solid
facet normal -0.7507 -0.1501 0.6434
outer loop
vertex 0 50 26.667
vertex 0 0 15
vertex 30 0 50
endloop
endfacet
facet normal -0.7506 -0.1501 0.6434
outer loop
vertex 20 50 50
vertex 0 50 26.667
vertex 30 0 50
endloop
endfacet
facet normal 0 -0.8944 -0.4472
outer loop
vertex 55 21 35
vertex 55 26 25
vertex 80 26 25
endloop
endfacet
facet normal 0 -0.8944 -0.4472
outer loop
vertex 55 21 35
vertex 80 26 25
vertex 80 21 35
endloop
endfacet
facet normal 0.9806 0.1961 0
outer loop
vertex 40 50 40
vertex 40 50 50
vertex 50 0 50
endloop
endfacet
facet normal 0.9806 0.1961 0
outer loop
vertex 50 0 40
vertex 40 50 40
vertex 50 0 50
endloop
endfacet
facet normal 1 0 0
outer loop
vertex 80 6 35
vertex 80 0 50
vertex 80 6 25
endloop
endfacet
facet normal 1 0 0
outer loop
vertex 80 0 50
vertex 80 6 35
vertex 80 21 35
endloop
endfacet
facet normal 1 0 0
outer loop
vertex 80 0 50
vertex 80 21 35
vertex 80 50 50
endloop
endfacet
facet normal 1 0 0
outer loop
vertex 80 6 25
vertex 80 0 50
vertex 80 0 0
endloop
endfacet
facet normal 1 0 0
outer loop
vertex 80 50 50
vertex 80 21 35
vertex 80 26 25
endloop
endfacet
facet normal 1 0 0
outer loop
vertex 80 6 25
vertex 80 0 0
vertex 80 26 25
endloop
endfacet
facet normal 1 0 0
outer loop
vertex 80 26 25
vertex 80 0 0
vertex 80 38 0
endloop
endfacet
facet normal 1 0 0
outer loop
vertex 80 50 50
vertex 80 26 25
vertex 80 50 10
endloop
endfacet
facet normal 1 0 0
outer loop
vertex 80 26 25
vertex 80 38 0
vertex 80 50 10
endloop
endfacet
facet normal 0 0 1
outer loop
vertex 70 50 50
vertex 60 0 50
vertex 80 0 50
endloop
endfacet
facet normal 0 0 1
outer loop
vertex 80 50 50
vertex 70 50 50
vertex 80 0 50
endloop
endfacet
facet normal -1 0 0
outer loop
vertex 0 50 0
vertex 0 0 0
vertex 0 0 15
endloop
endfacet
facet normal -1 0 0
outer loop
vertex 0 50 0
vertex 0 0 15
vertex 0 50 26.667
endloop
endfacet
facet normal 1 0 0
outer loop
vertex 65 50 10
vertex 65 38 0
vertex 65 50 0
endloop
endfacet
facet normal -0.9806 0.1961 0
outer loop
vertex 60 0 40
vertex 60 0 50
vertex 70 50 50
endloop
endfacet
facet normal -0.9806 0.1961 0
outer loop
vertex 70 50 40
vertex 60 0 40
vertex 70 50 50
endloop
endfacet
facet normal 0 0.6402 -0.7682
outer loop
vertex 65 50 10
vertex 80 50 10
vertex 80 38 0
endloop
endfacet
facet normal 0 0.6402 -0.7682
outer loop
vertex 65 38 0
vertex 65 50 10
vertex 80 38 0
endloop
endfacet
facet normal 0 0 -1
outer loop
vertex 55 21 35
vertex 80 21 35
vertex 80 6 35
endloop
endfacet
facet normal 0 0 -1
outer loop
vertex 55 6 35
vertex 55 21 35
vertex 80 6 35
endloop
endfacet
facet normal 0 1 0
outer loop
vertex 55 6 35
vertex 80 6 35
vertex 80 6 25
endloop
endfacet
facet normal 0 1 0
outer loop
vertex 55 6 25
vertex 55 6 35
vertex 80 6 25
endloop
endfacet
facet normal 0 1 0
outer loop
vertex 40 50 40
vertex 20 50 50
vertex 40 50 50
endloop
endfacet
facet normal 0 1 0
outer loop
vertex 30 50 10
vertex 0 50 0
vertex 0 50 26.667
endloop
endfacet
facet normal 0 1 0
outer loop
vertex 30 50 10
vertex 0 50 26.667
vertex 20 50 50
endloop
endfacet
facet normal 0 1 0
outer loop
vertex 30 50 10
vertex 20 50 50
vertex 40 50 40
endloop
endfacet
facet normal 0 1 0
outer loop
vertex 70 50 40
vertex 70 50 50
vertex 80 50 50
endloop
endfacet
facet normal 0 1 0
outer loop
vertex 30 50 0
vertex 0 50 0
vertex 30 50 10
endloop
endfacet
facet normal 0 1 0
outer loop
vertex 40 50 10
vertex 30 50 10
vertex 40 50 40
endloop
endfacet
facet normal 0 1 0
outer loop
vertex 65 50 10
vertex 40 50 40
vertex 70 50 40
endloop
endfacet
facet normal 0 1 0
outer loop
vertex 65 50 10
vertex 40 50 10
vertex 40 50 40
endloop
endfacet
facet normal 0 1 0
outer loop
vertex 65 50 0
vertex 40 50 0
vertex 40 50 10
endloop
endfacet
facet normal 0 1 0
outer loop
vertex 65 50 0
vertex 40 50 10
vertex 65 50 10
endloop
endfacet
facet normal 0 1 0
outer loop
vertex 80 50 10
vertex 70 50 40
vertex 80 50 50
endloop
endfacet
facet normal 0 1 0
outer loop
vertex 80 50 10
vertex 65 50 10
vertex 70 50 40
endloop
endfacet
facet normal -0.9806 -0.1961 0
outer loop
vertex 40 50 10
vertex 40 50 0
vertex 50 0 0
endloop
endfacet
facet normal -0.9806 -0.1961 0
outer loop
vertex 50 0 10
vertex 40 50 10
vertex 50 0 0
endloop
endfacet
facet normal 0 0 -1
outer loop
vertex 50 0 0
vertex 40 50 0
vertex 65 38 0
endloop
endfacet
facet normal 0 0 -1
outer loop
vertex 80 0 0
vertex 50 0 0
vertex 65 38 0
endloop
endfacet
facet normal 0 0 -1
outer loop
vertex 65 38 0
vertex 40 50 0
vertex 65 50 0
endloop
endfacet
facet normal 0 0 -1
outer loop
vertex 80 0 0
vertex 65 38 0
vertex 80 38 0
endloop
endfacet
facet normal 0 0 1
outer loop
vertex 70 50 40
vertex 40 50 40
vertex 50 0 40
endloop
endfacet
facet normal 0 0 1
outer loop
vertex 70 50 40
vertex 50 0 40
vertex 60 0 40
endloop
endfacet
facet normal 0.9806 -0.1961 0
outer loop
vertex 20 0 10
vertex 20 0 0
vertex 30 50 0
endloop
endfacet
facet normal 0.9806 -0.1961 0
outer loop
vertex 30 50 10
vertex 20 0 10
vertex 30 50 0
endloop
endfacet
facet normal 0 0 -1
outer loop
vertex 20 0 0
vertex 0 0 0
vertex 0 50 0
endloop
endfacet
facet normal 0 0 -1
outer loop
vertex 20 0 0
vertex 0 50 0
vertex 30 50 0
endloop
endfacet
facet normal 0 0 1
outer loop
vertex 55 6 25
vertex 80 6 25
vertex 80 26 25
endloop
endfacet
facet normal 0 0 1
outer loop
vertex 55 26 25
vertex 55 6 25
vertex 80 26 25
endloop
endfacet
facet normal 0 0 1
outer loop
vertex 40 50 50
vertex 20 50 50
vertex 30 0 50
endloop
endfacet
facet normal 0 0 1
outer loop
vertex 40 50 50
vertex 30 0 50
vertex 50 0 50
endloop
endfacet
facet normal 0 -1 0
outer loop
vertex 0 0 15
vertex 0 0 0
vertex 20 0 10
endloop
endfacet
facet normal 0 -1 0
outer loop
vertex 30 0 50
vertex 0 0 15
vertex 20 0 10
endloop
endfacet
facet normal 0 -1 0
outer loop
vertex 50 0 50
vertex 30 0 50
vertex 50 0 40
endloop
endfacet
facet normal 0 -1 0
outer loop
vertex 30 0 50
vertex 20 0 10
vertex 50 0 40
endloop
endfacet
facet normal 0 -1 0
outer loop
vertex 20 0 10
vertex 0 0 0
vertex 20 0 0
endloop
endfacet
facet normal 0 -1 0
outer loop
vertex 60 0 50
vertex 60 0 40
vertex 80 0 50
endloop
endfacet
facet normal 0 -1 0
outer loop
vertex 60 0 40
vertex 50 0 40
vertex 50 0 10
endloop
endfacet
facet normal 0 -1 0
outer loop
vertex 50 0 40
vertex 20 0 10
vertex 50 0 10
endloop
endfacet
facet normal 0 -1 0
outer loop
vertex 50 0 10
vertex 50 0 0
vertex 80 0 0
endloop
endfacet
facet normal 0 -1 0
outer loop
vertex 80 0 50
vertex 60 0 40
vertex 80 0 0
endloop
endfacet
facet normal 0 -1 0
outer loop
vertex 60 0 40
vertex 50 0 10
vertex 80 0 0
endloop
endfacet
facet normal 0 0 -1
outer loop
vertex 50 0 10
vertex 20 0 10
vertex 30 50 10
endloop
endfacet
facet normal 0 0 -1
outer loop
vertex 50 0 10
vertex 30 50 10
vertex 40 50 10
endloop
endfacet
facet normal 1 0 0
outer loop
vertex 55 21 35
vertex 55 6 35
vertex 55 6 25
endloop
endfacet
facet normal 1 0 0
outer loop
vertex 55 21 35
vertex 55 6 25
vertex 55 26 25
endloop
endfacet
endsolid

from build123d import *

# Parameters (mm, degrees)
F0_W      = 80
F0_H      = 50
F1_DEPTH  = 50
F6_DEPTH  = 10
F8_DEPTH  = 15
F10_DEPTH = 25
F12_DEPTH = 10


with BuildPart() as f1:
    # F0 (on Top) → F1 (new body)
    with BuildSketch(Plane.XY):
        with Locations((40, 25)):
            Rectangle(F0_W, F0_H)
    extrude(amount=F1_DEPTH)

    # F4: sweep along a path in F3
    with BuildLine(Plane.XY.offset(50)) as f4_path:
        Line((30, 0), (20, 50))
    # F2 (on face) → F4 (sweep, cut)
    with BuildSketch(Plane.XZ):
        Polygon((0, 50), (0, 15), (30, 50), align=None)
    sweep(path=f4_path.line, mode=Mode.SUBTRACT)

    # F5 (on face) → F6 (cut)
    with BuildSketch(Plane(origin=(0, 0, 0), x_dir=(1, 0, 0), z_dir=(0, 0, -1))):
        Polygon((50, 0), (20, 0), (30, -50), (40, -50), align=None)
    extrude(amount=-F6_DEPTH, mode=Mode.SUBTRACT)

    # F7 (on face) → F8 (cut)
    with BuildSketch(Plane.YZ.offset(80)):
        Polygon((38, 0), (50, 0), (50, 10), align=None)
    extrude(amount=-F8_DEPTH, mode=Mode.SUBTRACT)

    # F9 (on face) → F10 (cut)
    with BuildSketch(Plane.YZ.offset(80)):
        Polygon((21, 35), (6, 35), (6, 25), (26, 25), align=None)
    extrude(amount=-F10_DEPTH, mode=Mode.SUBTRACT)

    # F11 (on face) → F12 (cut)
    with BuildSketch(Plane.XY.offset(50)):
        Polygon((40, 50), (50, 0), (60, 0), (70, 50), align=None)
    extrude(amount=-F12_DEPTH, mode=Mode.SUBTRACT)


solid = f1.part
